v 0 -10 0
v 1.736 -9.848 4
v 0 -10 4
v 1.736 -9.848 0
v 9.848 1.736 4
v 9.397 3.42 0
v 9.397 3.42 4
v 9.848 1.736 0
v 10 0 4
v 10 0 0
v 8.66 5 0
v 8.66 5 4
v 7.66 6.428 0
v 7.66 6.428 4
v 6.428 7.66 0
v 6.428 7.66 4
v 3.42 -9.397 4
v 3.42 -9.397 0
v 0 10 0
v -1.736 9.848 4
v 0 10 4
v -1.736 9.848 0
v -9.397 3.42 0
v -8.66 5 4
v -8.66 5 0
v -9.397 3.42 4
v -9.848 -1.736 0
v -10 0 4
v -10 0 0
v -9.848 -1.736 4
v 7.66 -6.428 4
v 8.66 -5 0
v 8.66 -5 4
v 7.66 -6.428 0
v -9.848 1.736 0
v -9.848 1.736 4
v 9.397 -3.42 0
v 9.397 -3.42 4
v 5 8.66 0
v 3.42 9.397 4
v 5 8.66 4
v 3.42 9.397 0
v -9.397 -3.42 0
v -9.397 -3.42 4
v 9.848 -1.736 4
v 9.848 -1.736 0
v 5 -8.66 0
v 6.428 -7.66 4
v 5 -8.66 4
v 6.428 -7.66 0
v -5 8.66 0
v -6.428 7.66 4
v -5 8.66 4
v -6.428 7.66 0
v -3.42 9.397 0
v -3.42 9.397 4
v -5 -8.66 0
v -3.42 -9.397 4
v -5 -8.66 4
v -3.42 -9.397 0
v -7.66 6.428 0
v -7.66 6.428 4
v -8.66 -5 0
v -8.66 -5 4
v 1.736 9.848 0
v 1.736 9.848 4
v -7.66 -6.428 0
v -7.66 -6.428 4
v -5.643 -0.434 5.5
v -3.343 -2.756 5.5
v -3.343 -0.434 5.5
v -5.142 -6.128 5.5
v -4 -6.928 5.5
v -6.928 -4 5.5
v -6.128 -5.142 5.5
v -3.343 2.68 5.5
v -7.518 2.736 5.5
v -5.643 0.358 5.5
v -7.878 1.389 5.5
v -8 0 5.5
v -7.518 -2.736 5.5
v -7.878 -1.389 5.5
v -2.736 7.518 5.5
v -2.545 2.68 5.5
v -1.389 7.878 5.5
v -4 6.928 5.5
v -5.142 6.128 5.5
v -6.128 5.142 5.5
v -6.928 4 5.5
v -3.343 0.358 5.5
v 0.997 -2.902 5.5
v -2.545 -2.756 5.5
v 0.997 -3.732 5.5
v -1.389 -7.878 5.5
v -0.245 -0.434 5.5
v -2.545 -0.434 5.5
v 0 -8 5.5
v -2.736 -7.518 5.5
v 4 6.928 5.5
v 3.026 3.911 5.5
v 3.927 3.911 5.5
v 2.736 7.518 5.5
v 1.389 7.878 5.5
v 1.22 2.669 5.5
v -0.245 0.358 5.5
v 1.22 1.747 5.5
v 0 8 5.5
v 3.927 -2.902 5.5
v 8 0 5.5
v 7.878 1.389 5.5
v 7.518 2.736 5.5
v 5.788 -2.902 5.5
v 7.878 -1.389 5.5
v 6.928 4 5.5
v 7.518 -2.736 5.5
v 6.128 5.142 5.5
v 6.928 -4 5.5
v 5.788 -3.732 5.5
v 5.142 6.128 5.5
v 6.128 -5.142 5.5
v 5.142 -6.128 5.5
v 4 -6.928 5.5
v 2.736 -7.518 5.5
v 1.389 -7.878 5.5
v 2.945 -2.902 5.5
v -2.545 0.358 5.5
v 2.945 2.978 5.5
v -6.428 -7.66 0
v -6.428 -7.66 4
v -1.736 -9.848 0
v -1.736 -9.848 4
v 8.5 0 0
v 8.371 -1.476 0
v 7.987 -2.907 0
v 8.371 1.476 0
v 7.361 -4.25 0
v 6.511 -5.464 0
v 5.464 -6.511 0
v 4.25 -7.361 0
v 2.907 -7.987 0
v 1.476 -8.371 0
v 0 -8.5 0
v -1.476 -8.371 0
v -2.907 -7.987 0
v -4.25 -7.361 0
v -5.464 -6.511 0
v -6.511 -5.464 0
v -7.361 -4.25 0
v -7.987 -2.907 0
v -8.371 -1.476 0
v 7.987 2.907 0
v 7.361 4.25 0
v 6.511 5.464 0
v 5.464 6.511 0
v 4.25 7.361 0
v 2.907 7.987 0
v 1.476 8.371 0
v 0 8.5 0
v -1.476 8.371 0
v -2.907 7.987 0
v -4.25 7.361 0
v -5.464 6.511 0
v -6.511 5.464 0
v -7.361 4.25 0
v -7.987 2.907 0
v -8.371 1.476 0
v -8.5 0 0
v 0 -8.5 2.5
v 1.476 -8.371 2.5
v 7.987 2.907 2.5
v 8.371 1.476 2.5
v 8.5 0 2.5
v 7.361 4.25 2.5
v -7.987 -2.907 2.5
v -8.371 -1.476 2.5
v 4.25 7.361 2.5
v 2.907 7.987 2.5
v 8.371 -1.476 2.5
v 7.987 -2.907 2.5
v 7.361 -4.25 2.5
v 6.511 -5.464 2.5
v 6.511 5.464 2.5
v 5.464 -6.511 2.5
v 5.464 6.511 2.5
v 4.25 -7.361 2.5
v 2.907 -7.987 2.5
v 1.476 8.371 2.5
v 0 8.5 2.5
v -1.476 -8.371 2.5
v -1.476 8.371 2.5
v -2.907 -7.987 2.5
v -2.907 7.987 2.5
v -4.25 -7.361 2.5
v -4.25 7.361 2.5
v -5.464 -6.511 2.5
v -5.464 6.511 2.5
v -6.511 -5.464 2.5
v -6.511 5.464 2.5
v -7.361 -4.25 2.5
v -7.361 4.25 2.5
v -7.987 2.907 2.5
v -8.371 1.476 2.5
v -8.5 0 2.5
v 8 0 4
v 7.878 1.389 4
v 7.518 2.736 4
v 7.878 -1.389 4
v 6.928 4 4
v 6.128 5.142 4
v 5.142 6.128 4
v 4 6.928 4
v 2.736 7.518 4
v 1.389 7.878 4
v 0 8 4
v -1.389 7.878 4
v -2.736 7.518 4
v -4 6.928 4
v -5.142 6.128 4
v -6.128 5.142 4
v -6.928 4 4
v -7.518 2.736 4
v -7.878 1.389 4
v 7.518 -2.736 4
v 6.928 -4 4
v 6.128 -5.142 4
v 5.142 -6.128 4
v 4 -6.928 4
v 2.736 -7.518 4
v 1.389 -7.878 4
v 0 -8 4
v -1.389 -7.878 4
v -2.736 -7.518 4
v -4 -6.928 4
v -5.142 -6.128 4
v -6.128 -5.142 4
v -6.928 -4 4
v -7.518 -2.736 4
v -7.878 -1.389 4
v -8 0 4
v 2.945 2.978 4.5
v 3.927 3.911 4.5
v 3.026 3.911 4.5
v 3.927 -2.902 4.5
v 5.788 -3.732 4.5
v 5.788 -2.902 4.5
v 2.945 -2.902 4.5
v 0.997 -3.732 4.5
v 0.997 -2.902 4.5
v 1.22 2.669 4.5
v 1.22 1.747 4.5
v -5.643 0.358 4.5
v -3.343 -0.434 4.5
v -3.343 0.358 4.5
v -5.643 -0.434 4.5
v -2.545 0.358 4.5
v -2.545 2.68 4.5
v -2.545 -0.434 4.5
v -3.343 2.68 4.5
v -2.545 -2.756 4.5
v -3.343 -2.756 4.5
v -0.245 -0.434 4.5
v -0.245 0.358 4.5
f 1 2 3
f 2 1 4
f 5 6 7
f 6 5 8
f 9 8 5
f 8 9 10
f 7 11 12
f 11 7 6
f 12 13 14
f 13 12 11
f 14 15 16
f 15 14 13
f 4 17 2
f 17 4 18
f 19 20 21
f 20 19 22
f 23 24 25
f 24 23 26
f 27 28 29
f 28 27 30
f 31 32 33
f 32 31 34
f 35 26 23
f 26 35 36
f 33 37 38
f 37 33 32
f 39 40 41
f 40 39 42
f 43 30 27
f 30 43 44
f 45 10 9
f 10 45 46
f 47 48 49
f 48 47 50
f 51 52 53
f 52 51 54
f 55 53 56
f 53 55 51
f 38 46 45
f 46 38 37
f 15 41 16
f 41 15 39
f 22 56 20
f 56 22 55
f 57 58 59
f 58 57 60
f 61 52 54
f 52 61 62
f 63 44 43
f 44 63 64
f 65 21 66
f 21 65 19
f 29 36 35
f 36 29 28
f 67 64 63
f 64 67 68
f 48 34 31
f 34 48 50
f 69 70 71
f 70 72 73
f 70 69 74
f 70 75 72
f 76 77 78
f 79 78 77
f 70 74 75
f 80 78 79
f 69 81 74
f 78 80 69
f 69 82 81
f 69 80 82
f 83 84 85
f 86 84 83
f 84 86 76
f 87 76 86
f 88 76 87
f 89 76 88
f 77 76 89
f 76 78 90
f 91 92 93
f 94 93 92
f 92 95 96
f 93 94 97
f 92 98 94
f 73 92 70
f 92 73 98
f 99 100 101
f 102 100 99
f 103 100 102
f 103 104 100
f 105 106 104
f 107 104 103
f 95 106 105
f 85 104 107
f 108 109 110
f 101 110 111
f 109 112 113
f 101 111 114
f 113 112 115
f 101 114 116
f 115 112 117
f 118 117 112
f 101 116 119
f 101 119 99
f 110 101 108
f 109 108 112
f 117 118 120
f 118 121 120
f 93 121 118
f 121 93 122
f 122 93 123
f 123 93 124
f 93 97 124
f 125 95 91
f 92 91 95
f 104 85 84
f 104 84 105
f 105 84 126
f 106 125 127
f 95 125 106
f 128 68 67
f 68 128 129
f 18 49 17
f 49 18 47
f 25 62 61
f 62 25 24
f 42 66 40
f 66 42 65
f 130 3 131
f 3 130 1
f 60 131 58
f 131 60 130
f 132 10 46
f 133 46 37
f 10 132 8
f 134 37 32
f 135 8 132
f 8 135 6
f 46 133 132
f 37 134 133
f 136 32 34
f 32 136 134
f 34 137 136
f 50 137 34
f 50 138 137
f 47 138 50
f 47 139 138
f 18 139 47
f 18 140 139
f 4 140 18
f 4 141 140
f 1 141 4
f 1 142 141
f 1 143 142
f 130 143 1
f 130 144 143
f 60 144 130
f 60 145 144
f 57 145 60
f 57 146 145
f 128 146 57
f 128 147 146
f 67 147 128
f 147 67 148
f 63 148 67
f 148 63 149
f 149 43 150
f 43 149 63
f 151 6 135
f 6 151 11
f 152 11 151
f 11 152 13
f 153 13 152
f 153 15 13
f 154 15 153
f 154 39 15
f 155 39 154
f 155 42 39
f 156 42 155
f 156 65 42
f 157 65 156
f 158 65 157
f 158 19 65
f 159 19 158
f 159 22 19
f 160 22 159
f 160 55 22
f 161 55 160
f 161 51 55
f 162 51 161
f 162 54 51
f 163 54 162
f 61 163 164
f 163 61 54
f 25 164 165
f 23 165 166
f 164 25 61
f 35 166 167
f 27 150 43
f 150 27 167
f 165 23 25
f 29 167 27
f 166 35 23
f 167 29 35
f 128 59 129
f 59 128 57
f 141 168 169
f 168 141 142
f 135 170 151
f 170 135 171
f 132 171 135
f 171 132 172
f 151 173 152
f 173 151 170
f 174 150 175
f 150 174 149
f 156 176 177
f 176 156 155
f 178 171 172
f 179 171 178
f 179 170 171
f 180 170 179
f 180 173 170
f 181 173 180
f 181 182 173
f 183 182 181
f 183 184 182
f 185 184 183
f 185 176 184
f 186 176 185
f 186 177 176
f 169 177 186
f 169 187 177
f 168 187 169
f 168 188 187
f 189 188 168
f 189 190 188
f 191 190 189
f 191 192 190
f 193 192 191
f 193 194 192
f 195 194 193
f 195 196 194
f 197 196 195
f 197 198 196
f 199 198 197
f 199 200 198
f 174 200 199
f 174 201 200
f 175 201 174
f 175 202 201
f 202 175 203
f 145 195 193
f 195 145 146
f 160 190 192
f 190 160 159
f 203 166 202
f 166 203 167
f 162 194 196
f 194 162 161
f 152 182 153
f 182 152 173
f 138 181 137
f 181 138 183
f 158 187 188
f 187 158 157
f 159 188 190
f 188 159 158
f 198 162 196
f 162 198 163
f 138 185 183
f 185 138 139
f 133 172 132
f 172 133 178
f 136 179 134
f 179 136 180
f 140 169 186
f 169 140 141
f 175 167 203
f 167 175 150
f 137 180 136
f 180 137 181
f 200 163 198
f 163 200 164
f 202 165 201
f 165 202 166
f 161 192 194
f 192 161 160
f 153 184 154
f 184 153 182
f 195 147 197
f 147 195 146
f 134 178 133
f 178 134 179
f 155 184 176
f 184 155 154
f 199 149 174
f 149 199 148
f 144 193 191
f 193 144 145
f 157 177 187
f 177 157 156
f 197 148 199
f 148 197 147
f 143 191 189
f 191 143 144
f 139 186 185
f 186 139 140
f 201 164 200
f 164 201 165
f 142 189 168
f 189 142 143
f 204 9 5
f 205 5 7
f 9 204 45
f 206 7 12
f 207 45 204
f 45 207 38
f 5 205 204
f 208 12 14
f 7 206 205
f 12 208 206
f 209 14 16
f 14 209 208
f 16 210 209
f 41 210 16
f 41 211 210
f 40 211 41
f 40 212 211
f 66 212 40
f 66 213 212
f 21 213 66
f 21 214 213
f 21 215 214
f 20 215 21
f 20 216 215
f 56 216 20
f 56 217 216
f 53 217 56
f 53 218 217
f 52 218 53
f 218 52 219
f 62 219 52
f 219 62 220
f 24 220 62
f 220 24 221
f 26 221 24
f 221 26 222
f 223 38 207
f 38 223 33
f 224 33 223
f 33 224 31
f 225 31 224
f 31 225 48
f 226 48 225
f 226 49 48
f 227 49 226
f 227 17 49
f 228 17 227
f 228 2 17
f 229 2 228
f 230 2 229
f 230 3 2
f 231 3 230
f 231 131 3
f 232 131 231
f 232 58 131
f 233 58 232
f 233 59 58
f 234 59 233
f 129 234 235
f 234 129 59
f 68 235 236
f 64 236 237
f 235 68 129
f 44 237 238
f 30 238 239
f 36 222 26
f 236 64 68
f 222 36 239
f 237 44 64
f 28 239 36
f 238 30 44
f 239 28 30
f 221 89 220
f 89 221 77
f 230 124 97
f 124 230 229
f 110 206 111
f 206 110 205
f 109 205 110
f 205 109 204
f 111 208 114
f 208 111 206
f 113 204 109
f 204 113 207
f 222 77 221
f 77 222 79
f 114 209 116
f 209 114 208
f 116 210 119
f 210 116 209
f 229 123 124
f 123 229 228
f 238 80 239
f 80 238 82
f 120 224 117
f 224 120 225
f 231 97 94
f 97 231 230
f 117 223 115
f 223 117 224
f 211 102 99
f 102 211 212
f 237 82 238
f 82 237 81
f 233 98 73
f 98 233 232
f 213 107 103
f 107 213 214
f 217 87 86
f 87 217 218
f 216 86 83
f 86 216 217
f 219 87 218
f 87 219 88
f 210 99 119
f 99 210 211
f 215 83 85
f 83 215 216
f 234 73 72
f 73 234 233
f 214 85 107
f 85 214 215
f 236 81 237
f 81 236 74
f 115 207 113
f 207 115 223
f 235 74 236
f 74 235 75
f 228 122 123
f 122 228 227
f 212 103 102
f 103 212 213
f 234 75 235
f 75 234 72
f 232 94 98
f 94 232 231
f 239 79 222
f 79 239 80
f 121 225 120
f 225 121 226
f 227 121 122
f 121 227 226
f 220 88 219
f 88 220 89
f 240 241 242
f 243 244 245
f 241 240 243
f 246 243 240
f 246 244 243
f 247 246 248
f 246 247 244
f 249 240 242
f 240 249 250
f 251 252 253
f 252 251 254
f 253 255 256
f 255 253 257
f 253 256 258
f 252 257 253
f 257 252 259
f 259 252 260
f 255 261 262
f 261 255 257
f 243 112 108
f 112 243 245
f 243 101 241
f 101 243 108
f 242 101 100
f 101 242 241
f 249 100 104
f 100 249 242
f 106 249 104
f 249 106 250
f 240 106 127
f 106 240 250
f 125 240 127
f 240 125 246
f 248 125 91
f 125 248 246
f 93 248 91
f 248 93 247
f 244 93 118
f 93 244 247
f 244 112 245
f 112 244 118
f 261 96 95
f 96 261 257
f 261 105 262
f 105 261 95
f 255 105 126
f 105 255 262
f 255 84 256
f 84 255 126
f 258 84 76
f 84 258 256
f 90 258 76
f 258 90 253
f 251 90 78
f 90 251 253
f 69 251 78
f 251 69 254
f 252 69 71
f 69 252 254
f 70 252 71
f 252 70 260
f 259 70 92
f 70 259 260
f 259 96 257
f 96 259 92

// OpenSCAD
difference() {
	difference() {
		difference() {
			cylinder($fn = 36, h = 5.5000000000, r = 10);
			translate(v = [0, 0, -1]) {
				cylinder($fn = 36, h = 3.5000000000, r = 8.5000000000);
			}
		}
		translate(v = [0, 0, 4]) {
			difference() {
				cylinder($fn = 36, h = 3, r = 10.5000000000);
				cylinder($fn = 36, h = 3, r = 8);
			}
		}
	}
	translate(v = [0, 0, 4.5000000000]) {
		linear_extrude(height = 3) {
			text(halign = "center", size = 8, text = "+1", valign = "center");
		}
	}
}
